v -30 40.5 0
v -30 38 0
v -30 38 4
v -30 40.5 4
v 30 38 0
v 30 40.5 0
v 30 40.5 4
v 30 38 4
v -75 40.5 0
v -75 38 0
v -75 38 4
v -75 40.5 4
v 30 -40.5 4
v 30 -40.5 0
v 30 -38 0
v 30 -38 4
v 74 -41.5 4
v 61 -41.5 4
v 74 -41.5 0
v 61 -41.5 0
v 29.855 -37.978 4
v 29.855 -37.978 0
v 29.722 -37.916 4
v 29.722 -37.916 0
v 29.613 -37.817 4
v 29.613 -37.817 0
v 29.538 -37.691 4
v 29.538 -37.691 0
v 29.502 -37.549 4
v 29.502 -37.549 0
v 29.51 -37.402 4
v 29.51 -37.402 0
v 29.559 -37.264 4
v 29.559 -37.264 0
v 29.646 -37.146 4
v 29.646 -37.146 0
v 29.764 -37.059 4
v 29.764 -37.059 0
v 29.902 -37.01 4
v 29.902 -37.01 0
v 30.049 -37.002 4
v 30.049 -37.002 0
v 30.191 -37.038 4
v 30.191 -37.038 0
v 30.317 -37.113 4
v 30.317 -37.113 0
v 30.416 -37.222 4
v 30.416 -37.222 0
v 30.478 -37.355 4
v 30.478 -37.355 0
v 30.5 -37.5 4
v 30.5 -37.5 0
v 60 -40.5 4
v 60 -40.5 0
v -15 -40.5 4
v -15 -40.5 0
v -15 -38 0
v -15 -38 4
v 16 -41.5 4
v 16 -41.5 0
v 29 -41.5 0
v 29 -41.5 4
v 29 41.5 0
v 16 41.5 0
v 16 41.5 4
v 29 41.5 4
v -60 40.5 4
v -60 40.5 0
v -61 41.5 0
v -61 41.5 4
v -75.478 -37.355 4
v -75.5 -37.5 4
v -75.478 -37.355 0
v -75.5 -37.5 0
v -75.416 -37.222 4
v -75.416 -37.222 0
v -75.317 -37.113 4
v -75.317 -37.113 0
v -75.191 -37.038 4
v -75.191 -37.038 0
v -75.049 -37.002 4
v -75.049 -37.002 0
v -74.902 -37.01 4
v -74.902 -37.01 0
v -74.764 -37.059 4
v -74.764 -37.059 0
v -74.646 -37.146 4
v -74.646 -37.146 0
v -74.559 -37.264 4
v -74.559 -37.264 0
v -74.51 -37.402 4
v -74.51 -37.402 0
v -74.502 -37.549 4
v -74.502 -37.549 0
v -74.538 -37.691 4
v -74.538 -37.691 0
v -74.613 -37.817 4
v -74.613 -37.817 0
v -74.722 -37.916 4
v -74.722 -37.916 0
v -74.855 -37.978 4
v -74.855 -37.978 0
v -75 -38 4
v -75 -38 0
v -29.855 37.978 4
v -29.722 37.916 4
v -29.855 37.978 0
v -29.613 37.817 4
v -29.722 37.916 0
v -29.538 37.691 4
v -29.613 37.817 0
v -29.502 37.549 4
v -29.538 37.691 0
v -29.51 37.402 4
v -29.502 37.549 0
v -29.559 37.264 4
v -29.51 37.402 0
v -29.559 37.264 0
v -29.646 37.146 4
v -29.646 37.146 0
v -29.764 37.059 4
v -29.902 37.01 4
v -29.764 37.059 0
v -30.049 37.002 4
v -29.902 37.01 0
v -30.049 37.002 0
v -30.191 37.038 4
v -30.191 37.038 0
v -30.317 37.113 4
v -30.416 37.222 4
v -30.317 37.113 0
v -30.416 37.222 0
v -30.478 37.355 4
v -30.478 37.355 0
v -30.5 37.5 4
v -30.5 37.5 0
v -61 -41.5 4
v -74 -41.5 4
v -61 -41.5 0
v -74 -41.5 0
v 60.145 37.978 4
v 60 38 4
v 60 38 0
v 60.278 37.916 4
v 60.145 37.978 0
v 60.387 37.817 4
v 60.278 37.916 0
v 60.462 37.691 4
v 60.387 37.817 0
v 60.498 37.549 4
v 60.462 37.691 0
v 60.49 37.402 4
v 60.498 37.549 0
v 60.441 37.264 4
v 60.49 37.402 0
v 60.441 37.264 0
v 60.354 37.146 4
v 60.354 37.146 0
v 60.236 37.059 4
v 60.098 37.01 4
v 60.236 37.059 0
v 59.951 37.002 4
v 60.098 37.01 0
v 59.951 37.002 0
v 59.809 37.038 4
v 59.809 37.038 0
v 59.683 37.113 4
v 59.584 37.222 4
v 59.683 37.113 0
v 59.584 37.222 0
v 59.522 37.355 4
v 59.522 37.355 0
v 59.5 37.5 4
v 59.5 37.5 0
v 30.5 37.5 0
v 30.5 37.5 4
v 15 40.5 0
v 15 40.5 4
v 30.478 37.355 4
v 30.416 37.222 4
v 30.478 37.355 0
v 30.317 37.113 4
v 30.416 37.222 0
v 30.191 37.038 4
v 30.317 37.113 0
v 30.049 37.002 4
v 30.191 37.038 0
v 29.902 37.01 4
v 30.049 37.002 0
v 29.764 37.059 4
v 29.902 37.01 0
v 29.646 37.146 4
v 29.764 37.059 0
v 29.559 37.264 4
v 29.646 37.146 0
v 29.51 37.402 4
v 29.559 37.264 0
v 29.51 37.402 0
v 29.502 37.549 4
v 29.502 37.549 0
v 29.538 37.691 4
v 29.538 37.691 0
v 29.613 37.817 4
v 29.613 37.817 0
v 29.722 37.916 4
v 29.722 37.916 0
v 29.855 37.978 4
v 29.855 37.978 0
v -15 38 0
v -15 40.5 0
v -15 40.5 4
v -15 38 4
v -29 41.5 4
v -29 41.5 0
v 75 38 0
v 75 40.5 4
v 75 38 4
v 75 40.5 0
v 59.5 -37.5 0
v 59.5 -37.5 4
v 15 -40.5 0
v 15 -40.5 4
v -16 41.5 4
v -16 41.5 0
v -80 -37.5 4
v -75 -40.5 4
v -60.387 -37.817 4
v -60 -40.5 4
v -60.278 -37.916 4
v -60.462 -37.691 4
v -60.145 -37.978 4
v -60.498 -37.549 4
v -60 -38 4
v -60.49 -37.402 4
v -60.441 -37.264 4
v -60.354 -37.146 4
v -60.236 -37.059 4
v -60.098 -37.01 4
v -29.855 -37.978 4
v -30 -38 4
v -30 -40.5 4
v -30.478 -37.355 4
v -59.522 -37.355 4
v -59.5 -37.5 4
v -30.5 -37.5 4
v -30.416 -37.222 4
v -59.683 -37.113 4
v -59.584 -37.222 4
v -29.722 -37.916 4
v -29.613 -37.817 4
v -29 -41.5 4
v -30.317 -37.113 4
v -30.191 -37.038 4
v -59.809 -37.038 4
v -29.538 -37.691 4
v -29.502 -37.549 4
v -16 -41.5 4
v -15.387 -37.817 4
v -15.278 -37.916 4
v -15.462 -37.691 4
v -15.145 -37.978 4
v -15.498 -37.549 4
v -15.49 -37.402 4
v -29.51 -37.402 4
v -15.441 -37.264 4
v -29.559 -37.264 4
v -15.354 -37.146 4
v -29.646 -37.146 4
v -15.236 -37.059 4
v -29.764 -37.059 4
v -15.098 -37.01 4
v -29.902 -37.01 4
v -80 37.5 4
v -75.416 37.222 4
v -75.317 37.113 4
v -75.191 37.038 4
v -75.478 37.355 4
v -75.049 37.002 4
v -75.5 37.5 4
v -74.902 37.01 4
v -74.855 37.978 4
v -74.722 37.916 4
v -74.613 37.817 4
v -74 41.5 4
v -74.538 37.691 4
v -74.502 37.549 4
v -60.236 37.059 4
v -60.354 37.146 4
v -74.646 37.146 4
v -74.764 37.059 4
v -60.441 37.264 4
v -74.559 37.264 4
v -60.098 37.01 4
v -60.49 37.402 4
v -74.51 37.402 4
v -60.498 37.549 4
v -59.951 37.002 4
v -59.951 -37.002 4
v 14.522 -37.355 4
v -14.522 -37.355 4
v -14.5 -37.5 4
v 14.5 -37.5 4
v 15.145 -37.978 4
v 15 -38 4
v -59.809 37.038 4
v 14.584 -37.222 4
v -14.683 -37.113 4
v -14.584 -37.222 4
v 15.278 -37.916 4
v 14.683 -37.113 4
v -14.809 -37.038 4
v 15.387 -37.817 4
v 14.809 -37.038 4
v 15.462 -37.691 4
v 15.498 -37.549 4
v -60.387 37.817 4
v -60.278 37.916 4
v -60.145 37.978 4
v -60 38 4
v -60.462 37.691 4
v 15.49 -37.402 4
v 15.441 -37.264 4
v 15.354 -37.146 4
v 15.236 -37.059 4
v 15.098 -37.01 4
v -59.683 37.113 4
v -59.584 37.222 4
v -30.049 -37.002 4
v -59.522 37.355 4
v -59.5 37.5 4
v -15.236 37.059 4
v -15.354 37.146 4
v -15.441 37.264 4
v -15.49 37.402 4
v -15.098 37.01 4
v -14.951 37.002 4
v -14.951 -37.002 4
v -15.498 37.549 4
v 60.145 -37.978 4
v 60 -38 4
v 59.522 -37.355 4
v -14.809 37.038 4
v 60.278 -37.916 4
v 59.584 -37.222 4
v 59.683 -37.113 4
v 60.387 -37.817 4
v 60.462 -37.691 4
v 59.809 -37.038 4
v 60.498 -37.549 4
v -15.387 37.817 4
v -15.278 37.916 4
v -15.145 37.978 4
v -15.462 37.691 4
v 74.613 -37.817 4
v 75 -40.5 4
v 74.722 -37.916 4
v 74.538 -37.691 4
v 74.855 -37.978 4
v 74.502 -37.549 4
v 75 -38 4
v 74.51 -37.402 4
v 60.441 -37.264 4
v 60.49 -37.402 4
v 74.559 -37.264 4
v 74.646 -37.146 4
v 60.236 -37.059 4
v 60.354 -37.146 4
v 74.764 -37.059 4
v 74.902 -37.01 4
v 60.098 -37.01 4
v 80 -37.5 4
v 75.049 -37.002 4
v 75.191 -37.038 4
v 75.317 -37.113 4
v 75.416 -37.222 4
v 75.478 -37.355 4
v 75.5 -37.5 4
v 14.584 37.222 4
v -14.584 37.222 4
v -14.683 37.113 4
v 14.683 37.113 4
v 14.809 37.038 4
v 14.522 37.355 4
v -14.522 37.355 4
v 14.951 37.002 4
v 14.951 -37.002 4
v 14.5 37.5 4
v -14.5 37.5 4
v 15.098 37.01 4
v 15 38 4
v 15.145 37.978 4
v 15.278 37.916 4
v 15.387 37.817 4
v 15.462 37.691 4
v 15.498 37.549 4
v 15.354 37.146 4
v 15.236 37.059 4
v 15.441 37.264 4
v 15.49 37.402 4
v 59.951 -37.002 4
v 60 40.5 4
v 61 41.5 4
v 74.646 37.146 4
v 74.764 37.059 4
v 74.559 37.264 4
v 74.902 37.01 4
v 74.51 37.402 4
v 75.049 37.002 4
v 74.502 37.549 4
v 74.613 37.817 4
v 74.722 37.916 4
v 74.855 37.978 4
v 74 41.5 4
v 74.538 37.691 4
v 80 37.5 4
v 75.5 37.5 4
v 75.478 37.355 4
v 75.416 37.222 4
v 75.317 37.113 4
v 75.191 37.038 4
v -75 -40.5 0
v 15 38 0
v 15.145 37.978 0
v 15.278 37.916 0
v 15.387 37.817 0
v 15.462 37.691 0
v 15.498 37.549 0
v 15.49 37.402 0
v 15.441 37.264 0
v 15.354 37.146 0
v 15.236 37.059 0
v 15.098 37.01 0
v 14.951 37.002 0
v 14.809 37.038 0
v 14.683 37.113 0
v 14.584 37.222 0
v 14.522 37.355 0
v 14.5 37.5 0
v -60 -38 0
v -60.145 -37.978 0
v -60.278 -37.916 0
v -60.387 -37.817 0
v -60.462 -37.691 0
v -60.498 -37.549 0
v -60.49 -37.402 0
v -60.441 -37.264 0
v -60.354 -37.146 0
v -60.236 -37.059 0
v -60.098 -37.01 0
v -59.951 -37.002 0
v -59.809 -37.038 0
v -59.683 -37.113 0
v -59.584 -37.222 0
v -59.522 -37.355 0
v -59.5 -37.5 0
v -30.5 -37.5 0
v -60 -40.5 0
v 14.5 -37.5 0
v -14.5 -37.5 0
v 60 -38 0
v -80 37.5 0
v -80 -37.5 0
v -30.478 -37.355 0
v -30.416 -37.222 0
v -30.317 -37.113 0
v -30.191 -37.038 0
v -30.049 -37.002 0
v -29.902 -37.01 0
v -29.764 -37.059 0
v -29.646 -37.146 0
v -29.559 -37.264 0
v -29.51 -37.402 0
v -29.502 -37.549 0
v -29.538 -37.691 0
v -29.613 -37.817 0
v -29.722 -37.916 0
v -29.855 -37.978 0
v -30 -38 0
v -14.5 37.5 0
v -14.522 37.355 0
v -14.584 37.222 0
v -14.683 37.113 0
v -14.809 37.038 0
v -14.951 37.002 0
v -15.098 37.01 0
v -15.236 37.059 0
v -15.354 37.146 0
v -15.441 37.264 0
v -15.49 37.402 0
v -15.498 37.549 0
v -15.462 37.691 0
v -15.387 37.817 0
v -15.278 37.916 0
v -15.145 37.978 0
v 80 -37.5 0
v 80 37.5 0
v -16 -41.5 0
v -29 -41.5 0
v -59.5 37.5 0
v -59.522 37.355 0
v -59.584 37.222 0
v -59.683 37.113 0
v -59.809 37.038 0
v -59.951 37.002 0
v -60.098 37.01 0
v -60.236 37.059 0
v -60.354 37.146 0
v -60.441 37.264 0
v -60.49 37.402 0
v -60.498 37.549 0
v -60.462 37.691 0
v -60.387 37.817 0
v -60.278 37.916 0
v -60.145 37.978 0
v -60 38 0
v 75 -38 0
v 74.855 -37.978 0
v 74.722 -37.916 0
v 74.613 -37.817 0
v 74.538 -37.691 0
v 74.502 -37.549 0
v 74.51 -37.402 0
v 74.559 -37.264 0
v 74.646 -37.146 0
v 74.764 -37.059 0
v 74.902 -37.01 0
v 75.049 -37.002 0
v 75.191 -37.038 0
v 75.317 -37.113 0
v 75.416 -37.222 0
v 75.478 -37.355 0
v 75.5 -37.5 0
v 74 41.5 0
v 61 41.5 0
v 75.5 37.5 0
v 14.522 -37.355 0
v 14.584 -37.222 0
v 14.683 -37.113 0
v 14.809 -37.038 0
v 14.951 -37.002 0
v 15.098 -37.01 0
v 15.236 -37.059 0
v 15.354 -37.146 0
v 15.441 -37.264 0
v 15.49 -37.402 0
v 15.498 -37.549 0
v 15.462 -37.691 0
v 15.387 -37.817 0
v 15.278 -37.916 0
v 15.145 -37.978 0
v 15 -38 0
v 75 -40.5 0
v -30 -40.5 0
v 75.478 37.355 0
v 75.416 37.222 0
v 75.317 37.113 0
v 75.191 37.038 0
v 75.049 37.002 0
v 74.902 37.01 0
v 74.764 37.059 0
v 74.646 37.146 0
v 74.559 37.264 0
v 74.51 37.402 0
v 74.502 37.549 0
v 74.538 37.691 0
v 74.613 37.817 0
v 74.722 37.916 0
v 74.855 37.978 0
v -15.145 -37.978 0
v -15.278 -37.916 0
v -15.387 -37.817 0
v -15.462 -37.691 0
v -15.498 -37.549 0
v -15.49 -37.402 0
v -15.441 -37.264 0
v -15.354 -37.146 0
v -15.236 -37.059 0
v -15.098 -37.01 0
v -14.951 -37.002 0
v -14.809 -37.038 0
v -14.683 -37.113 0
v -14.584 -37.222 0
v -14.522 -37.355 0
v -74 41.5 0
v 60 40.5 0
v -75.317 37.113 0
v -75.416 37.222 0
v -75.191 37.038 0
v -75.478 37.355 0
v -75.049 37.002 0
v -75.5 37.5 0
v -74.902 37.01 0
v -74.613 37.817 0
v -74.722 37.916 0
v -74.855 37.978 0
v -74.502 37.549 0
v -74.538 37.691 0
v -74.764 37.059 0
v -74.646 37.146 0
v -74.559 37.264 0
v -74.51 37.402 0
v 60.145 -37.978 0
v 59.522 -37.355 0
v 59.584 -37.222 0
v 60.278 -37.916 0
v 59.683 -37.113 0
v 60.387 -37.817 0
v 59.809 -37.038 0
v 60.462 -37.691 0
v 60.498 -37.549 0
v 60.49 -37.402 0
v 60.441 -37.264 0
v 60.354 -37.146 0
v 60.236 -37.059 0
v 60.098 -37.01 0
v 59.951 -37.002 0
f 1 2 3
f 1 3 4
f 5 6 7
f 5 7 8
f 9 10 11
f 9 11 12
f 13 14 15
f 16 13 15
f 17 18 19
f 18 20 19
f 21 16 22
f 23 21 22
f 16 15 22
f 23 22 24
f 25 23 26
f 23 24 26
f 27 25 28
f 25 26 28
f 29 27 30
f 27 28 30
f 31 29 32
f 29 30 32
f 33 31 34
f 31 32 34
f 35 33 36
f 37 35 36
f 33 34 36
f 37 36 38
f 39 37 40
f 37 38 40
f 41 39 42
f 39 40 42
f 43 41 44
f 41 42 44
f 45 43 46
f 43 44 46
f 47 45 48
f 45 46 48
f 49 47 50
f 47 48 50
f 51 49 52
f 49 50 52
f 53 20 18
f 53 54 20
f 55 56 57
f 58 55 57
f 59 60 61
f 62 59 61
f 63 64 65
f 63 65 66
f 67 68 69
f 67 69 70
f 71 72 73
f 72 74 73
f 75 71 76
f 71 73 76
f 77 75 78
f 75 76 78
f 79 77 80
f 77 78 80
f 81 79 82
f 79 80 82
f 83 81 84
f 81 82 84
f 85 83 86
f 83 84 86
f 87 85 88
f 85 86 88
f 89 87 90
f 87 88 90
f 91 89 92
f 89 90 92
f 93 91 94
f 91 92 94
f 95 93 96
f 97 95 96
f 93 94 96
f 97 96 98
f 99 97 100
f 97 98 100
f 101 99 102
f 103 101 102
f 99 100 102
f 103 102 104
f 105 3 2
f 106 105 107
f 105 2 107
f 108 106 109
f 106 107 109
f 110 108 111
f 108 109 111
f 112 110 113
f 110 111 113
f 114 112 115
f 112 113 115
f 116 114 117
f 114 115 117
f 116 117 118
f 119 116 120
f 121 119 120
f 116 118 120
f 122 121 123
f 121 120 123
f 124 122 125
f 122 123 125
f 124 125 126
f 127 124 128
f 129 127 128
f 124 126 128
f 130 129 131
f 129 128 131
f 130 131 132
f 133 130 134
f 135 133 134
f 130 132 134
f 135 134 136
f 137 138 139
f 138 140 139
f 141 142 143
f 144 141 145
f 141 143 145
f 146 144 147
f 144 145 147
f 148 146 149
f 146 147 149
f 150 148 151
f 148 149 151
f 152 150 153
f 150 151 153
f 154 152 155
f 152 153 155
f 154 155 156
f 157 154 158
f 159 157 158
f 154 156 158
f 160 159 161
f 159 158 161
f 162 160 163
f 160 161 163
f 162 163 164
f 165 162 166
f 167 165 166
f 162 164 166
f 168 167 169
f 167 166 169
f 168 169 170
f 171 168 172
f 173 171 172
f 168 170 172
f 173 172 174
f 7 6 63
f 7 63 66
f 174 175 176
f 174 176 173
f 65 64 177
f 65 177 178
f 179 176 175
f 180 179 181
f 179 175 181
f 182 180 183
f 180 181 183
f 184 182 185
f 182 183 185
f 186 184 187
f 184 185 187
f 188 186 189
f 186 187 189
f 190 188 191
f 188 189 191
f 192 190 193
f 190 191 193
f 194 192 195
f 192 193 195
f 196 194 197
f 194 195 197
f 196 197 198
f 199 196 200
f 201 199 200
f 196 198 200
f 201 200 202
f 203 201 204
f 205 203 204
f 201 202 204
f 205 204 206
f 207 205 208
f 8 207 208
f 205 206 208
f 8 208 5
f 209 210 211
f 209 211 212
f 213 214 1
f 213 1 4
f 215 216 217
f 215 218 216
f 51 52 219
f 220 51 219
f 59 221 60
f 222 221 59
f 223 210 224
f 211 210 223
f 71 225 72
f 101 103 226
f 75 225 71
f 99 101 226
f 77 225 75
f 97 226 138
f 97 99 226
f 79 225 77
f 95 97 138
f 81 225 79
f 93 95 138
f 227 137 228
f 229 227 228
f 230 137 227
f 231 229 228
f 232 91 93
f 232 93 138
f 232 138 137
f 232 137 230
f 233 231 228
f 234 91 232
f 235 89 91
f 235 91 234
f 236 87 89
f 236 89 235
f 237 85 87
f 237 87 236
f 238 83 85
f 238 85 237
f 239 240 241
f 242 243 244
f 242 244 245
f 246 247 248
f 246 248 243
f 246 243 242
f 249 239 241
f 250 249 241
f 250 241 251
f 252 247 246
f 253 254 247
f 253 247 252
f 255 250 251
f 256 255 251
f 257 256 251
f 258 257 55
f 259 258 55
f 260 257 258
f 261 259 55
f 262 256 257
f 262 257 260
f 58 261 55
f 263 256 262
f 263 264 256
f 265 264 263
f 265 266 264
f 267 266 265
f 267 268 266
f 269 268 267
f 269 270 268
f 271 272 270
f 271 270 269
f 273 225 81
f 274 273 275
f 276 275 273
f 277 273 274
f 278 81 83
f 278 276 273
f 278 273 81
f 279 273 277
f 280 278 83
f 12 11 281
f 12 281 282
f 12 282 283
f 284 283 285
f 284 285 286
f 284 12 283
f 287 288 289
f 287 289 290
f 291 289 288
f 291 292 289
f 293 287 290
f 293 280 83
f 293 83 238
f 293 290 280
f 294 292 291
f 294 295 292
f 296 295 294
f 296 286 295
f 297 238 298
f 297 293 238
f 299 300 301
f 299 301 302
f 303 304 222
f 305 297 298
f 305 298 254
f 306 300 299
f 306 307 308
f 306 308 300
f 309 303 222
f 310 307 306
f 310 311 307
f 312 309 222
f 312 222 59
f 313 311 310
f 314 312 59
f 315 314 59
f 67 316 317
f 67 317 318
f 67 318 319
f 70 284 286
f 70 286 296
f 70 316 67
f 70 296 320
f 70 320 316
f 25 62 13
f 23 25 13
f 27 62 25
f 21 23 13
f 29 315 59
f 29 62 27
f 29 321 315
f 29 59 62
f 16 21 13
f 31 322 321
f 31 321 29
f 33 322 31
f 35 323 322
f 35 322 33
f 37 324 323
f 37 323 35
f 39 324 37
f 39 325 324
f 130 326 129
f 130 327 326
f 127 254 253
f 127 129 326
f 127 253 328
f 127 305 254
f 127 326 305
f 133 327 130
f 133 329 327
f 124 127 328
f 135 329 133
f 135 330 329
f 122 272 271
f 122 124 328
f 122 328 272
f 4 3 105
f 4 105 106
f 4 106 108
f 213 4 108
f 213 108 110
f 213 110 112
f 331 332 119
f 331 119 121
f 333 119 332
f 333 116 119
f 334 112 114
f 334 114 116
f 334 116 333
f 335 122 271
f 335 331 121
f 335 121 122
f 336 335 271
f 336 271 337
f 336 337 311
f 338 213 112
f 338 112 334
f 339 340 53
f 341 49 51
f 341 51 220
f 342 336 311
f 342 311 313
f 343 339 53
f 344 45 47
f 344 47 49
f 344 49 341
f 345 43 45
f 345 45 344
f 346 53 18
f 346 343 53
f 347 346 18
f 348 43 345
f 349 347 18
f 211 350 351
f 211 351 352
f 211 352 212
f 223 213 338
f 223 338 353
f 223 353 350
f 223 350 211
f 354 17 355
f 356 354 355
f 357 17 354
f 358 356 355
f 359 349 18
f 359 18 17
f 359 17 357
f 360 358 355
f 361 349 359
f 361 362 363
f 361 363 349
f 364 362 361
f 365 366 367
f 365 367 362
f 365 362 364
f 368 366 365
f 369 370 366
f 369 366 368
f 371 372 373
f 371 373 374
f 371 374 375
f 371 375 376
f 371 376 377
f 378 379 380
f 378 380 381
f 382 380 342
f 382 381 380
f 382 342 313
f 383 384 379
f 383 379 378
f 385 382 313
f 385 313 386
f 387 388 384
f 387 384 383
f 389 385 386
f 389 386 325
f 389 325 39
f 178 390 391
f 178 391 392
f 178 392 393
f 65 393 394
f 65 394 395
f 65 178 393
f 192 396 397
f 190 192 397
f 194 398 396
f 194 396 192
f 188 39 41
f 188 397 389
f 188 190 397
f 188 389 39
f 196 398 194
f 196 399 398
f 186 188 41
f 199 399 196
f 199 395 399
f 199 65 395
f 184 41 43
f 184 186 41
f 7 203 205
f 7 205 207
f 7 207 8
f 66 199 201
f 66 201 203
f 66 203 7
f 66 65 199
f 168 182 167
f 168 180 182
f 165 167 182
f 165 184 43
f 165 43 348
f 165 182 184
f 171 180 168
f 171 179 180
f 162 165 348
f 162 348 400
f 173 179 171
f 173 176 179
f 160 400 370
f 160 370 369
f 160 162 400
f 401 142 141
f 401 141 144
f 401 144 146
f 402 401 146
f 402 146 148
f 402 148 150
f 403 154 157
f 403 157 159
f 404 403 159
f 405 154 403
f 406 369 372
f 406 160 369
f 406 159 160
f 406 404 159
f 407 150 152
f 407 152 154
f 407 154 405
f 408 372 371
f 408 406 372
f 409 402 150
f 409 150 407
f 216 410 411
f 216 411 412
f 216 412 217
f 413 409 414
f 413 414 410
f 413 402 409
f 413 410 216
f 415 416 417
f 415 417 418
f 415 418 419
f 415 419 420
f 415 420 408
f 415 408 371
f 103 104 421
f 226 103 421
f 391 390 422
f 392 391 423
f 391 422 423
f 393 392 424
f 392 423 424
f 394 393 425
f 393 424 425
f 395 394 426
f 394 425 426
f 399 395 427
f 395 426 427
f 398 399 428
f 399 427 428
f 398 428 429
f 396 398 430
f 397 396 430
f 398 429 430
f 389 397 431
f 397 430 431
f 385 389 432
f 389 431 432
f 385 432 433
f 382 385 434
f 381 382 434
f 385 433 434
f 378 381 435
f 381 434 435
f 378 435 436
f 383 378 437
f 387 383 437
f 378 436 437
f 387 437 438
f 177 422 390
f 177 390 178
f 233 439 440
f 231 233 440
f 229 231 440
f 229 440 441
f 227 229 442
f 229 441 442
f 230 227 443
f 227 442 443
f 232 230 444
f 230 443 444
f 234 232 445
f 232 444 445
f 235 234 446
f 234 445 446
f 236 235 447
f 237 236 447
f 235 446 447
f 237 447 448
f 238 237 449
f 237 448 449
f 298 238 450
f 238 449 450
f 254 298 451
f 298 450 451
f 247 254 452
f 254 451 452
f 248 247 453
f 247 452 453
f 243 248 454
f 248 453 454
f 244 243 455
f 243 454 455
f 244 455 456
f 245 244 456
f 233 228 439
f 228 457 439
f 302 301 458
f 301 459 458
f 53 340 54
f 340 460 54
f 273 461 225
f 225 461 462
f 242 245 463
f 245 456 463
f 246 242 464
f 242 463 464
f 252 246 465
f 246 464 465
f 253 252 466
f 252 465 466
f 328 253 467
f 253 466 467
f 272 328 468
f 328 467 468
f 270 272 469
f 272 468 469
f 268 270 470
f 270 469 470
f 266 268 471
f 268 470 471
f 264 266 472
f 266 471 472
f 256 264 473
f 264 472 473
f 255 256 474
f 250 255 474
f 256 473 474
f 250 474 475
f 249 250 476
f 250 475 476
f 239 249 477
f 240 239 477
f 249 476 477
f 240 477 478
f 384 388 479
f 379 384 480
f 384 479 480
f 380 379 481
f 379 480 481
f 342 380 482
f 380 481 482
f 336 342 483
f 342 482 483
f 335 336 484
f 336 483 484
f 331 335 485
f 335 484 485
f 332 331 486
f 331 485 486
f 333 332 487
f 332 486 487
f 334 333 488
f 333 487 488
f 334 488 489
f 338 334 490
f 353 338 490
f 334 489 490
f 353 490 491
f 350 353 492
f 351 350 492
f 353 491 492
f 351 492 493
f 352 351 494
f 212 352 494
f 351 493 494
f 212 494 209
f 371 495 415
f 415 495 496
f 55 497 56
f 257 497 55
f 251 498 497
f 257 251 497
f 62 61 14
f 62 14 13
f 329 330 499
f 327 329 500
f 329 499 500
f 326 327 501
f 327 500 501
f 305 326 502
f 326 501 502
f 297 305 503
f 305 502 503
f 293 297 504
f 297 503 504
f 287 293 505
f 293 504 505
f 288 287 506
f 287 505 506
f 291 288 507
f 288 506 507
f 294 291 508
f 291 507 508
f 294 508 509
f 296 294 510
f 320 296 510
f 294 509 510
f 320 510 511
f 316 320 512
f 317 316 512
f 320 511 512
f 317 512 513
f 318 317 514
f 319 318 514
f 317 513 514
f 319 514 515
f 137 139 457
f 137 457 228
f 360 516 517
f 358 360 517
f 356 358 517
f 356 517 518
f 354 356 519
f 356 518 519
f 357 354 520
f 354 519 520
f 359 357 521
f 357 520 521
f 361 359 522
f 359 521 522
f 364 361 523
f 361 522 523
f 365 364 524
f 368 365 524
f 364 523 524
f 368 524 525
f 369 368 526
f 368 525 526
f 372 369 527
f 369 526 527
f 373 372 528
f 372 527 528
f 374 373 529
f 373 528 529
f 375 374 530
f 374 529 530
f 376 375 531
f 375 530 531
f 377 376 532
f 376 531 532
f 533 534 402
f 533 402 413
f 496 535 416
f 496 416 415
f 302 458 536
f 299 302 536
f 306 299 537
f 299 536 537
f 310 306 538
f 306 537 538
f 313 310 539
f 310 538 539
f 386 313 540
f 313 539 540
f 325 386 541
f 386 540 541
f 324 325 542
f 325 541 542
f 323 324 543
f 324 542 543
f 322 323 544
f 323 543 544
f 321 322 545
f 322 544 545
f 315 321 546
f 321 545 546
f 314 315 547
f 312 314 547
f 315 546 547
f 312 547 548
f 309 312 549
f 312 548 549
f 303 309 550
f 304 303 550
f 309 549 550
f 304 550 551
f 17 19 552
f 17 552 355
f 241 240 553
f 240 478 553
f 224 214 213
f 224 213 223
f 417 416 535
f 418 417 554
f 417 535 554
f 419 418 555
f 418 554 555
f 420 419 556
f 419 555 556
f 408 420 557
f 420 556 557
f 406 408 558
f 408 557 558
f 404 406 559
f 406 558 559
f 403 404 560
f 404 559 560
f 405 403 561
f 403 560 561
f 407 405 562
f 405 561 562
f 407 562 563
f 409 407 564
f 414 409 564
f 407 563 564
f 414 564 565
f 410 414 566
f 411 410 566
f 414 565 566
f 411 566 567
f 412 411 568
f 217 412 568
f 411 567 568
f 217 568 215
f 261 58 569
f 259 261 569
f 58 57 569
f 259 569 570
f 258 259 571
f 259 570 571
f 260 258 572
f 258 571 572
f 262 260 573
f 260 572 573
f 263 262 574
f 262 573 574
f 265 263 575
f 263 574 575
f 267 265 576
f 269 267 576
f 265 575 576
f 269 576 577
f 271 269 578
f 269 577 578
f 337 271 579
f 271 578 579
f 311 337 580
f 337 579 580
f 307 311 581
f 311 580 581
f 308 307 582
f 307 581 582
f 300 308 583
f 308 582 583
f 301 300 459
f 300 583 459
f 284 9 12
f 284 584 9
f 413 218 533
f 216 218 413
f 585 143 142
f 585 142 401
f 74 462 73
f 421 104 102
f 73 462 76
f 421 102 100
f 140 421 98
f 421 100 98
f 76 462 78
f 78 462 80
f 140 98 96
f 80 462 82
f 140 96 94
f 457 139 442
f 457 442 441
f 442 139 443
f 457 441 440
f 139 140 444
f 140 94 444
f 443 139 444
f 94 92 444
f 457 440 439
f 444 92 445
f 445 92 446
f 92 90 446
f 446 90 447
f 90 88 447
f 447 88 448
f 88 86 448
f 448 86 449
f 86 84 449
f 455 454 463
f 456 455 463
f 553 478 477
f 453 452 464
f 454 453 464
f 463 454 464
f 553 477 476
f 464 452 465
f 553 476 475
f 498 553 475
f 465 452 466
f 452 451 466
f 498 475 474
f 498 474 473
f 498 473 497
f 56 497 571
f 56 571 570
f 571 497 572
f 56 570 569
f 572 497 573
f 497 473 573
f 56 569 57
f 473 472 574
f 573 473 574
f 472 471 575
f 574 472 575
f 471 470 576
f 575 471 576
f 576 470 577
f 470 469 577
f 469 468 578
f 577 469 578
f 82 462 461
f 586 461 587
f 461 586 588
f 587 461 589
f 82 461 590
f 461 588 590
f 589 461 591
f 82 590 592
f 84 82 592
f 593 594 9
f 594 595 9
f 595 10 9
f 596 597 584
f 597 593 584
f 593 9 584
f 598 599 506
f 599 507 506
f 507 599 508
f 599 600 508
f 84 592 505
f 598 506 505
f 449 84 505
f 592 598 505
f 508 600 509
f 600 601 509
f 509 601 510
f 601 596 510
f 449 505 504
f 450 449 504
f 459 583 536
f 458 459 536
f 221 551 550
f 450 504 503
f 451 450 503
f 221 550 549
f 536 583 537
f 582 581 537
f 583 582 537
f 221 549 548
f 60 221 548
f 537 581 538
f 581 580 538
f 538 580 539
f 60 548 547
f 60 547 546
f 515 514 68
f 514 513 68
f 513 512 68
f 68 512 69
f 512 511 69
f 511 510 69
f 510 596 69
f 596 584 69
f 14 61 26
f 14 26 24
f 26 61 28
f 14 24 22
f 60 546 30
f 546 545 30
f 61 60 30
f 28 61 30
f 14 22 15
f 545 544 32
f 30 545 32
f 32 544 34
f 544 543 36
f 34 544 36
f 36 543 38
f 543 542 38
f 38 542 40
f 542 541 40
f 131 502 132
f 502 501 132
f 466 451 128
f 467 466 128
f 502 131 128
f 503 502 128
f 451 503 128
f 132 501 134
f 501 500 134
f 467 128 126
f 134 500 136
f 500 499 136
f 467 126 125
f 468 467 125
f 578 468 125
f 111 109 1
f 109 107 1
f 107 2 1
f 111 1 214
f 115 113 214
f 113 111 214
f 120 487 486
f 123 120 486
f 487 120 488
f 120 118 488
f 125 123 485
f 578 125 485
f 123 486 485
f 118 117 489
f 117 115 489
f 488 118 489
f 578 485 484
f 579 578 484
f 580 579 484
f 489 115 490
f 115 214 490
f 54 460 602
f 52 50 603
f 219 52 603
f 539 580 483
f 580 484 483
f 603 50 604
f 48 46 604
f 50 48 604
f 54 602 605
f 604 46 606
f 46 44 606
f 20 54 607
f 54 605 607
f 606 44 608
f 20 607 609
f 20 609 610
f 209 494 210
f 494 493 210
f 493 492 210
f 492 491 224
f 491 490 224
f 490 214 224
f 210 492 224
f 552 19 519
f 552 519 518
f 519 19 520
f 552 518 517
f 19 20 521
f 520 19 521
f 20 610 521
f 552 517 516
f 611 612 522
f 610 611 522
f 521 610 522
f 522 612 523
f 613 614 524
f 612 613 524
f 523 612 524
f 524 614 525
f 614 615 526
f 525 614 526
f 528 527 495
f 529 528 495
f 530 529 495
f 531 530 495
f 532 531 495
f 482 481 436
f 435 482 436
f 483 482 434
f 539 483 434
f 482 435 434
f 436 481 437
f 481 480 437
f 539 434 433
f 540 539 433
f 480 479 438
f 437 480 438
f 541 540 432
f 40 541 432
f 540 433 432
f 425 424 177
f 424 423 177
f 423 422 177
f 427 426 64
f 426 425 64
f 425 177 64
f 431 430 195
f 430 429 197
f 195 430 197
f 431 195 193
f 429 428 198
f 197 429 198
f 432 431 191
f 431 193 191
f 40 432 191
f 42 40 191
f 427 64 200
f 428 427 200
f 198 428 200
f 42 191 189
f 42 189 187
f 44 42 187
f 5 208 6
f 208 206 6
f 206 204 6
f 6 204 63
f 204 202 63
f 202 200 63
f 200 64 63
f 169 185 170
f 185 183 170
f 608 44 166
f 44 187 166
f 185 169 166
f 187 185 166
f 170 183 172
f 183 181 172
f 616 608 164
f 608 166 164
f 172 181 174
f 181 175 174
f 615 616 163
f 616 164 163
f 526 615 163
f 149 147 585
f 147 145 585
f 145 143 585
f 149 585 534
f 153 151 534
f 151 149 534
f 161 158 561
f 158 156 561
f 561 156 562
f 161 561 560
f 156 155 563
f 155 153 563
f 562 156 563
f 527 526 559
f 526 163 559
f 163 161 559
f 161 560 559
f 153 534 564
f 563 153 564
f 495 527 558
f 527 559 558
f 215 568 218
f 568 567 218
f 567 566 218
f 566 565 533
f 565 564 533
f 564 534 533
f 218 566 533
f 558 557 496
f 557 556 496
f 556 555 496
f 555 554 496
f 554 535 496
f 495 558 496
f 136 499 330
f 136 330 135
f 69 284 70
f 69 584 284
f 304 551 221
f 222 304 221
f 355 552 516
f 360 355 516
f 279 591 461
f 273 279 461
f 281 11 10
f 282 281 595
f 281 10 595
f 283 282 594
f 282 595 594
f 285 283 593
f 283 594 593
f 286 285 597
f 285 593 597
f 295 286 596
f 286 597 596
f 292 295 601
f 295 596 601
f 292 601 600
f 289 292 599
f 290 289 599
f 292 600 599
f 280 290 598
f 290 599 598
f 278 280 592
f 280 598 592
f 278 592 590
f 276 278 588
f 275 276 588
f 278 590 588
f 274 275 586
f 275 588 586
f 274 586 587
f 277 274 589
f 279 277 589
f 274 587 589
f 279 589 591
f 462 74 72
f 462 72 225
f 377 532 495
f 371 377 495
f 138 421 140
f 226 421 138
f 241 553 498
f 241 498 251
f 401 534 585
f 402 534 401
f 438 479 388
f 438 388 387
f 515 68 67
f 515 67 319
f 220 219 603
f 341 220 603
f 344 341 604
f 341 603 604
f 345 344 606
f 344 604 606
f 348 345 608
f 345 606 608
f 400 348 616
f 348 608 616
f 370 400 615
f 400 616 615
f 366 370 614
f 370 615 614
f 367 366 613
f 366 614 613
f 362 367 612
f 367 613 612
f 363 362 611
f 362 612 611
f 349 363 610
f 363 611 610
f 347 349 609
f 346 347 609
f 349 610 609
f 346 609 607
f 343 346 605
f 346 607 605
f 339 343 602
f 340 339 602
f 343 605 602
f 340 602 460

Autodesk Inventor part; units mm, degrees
ref_plane "Plan YZ" through (0, 0, 0) normal (1, 0, 0) x (0, 1, 0)
ref_plane "Plan XZ" through (0, 0, 0) normal (0, 1, 0) x (-1, 0, 0)
ref_plane "Plan XY" through (0, 0, 0) normal (0, 0, 1) x (1, 0, 0)
sketch "Esquisse1" plane through (0, 0, 0) normal (0, 0, 1) x (1, 0, 0)
  line L0 (0, -58.1) -> (0, 58.1) construction
  line L1 (-112, 0) -> (112, 0) construction
  line L2 (-75, 37.5) -> (-75, 41.5)
  line L3 (-75, 41.5) -> (-60, 41.5)
  line L4 (-60, 41.5) -> (-60, 37.5)
  line L5 (-30, 37.5) -> (-30, 41.5)
  line L6 (-30, 41.5) -> (-15, 41.5)
  line L7 (-15, 41.5) -> (-15, 37.5)
  line L8 (15, 37.5) -> (15, 41.5)
  line L9 (15, 41.5) -> (30, 41.5)
  line L10 (30, 41.5) -> (30, 37.5)
  line L11 (60, 37.5) -> (60, 41.5)
  line L12 (60, 41.5) -> (75, 41.5)
  line L13 (75, 41.5) -> (75, 37.5)
  line L14 (-60, 37.5) -> (-30, 37.5)
  line L15 (-15, 37.5) -> (15, 37.5)
  line L16 (30, 37.5) -> (60, 37.5)
  line L17 (-75, 37.5) -> (-80, 37.5)
  line L18 (75, 37.5) -> (80, 37.5)
  line L19 (-75, -37.5) -> (-75, -41.5)
  line L20 (-75, -41.5) -> (-60, -41.5)
  line L21 (-60, -41.5) -> (-60, -37.5)
  line L22 (-30, -37.5) -> (-30, -41.5)
  line L23 (-30, -41.5) -> (-15, -41.5)
  line L24 (-15, -41.5) -> (-15, -37.5)
  line L25 (15, -37.5) -> (15, -41.5)
  line L26 (15, -41.5) -> (30, -41.5)
  line L27 (30, -41.5) -> (30, -37.5)
  line L28 (60, -37.5) -> (60, -41.5)
  line L29 (60, -41.5) -> (75, -41.5)
  line L30 (75, -41.5) -> (75, -37.5)
  line L31 (-60, -37.5) -> (-30, -37.5)
  line L32 (-15, -37.5) -> (15, -37.5)
  line L33 (30, -37.5) -> (60, -37.5)
  line L34 (-75, -37.5) -> (-80, -37.5)
  line L35 (75, -37.5) -> (80, -37.5)
  line L36 (80, -37.5) -> (80, 37.5)
  line L37 (-80, 37.5) -> (-80, -37.5)
  dimension "d2" = 15
  dimension "d8" = 45
  dimension "d13" = 5
  dimension "d14" = 5
  dimension "d15" = 75
  dimension "d16" = 4
  dimension "d17" = 160
extrude "Extrusion1" add sketch "Esquisse1" along normal blind 4
sketch "Esquisse6" plane through (0, 0, 4) normal (0, 0, 1) x (1, 0, 0)
  line L0 (0, -58.1) -> (0, 58.1) construction
  line L1 (-112, 0) -> (112, 0) construction
  point P0 (0, 0)
  point P1 (-75, 37.5)
  point P2 (-60, 37.5)
  point P3 (-30, 37.5)
  point P4 (-15, 37.5)
  point P5 (15, 37.5)
  point P6 (75, 37.5)
  point P7 (30, 37.5)
  point P8 (60, 37.5)
  point P9 (-75, -37.5)
  point P10 (-60, -37.5)
  point P11 (-30, -37.5)
  point P12 (-15, -37.5)
  point P13 (15, -37.5)
  point P14 (75, -37.5)
  point P15 (30, -37.5)
  point P16 (60, -37.5)
hole "Perçage1" at (-75, 37.5, 4) at (-60, 37.5, 4) at (-30, 37.5, 4) at (-15, 37.5, 4) at (15, 37.5, 4) at (75, 37.5, 4) at (30, 37.5, 4) at (60, 37.5, 4) at (60, -37.5, 4) at (30, -37.5, 4) at (75, -37.5, 4) at (15, -37.5, 4) at (-15, -37.5, 4) at (-30, -37.5, 4) at (-60, -37.5, 4) at (-75, -37.5, 4) direction (0, 0, -1) diameter 1 end through all
chamfer "Chanfrein1" distance 1 angle 45 16 edges at (75, 41.5, 2) (60, 41.5, 2) (15, 41.5, 2) (-30, 41.5, 2) (-75, 41.5, 2) (30, 41.5, 2) (-15, 41.5, 2) (-60, 41.5, 2) (-60, -41.5, 2) (-15, -41.5, 2) (30, -41.5, 2) (75, -41.5, 2) (60, -41.5, 2) (-75, -41.5, 2) (-30, -41.5, 2) (15, -41.5, 2)
properties part number "P1704_005" material "Plastique PMMA"
